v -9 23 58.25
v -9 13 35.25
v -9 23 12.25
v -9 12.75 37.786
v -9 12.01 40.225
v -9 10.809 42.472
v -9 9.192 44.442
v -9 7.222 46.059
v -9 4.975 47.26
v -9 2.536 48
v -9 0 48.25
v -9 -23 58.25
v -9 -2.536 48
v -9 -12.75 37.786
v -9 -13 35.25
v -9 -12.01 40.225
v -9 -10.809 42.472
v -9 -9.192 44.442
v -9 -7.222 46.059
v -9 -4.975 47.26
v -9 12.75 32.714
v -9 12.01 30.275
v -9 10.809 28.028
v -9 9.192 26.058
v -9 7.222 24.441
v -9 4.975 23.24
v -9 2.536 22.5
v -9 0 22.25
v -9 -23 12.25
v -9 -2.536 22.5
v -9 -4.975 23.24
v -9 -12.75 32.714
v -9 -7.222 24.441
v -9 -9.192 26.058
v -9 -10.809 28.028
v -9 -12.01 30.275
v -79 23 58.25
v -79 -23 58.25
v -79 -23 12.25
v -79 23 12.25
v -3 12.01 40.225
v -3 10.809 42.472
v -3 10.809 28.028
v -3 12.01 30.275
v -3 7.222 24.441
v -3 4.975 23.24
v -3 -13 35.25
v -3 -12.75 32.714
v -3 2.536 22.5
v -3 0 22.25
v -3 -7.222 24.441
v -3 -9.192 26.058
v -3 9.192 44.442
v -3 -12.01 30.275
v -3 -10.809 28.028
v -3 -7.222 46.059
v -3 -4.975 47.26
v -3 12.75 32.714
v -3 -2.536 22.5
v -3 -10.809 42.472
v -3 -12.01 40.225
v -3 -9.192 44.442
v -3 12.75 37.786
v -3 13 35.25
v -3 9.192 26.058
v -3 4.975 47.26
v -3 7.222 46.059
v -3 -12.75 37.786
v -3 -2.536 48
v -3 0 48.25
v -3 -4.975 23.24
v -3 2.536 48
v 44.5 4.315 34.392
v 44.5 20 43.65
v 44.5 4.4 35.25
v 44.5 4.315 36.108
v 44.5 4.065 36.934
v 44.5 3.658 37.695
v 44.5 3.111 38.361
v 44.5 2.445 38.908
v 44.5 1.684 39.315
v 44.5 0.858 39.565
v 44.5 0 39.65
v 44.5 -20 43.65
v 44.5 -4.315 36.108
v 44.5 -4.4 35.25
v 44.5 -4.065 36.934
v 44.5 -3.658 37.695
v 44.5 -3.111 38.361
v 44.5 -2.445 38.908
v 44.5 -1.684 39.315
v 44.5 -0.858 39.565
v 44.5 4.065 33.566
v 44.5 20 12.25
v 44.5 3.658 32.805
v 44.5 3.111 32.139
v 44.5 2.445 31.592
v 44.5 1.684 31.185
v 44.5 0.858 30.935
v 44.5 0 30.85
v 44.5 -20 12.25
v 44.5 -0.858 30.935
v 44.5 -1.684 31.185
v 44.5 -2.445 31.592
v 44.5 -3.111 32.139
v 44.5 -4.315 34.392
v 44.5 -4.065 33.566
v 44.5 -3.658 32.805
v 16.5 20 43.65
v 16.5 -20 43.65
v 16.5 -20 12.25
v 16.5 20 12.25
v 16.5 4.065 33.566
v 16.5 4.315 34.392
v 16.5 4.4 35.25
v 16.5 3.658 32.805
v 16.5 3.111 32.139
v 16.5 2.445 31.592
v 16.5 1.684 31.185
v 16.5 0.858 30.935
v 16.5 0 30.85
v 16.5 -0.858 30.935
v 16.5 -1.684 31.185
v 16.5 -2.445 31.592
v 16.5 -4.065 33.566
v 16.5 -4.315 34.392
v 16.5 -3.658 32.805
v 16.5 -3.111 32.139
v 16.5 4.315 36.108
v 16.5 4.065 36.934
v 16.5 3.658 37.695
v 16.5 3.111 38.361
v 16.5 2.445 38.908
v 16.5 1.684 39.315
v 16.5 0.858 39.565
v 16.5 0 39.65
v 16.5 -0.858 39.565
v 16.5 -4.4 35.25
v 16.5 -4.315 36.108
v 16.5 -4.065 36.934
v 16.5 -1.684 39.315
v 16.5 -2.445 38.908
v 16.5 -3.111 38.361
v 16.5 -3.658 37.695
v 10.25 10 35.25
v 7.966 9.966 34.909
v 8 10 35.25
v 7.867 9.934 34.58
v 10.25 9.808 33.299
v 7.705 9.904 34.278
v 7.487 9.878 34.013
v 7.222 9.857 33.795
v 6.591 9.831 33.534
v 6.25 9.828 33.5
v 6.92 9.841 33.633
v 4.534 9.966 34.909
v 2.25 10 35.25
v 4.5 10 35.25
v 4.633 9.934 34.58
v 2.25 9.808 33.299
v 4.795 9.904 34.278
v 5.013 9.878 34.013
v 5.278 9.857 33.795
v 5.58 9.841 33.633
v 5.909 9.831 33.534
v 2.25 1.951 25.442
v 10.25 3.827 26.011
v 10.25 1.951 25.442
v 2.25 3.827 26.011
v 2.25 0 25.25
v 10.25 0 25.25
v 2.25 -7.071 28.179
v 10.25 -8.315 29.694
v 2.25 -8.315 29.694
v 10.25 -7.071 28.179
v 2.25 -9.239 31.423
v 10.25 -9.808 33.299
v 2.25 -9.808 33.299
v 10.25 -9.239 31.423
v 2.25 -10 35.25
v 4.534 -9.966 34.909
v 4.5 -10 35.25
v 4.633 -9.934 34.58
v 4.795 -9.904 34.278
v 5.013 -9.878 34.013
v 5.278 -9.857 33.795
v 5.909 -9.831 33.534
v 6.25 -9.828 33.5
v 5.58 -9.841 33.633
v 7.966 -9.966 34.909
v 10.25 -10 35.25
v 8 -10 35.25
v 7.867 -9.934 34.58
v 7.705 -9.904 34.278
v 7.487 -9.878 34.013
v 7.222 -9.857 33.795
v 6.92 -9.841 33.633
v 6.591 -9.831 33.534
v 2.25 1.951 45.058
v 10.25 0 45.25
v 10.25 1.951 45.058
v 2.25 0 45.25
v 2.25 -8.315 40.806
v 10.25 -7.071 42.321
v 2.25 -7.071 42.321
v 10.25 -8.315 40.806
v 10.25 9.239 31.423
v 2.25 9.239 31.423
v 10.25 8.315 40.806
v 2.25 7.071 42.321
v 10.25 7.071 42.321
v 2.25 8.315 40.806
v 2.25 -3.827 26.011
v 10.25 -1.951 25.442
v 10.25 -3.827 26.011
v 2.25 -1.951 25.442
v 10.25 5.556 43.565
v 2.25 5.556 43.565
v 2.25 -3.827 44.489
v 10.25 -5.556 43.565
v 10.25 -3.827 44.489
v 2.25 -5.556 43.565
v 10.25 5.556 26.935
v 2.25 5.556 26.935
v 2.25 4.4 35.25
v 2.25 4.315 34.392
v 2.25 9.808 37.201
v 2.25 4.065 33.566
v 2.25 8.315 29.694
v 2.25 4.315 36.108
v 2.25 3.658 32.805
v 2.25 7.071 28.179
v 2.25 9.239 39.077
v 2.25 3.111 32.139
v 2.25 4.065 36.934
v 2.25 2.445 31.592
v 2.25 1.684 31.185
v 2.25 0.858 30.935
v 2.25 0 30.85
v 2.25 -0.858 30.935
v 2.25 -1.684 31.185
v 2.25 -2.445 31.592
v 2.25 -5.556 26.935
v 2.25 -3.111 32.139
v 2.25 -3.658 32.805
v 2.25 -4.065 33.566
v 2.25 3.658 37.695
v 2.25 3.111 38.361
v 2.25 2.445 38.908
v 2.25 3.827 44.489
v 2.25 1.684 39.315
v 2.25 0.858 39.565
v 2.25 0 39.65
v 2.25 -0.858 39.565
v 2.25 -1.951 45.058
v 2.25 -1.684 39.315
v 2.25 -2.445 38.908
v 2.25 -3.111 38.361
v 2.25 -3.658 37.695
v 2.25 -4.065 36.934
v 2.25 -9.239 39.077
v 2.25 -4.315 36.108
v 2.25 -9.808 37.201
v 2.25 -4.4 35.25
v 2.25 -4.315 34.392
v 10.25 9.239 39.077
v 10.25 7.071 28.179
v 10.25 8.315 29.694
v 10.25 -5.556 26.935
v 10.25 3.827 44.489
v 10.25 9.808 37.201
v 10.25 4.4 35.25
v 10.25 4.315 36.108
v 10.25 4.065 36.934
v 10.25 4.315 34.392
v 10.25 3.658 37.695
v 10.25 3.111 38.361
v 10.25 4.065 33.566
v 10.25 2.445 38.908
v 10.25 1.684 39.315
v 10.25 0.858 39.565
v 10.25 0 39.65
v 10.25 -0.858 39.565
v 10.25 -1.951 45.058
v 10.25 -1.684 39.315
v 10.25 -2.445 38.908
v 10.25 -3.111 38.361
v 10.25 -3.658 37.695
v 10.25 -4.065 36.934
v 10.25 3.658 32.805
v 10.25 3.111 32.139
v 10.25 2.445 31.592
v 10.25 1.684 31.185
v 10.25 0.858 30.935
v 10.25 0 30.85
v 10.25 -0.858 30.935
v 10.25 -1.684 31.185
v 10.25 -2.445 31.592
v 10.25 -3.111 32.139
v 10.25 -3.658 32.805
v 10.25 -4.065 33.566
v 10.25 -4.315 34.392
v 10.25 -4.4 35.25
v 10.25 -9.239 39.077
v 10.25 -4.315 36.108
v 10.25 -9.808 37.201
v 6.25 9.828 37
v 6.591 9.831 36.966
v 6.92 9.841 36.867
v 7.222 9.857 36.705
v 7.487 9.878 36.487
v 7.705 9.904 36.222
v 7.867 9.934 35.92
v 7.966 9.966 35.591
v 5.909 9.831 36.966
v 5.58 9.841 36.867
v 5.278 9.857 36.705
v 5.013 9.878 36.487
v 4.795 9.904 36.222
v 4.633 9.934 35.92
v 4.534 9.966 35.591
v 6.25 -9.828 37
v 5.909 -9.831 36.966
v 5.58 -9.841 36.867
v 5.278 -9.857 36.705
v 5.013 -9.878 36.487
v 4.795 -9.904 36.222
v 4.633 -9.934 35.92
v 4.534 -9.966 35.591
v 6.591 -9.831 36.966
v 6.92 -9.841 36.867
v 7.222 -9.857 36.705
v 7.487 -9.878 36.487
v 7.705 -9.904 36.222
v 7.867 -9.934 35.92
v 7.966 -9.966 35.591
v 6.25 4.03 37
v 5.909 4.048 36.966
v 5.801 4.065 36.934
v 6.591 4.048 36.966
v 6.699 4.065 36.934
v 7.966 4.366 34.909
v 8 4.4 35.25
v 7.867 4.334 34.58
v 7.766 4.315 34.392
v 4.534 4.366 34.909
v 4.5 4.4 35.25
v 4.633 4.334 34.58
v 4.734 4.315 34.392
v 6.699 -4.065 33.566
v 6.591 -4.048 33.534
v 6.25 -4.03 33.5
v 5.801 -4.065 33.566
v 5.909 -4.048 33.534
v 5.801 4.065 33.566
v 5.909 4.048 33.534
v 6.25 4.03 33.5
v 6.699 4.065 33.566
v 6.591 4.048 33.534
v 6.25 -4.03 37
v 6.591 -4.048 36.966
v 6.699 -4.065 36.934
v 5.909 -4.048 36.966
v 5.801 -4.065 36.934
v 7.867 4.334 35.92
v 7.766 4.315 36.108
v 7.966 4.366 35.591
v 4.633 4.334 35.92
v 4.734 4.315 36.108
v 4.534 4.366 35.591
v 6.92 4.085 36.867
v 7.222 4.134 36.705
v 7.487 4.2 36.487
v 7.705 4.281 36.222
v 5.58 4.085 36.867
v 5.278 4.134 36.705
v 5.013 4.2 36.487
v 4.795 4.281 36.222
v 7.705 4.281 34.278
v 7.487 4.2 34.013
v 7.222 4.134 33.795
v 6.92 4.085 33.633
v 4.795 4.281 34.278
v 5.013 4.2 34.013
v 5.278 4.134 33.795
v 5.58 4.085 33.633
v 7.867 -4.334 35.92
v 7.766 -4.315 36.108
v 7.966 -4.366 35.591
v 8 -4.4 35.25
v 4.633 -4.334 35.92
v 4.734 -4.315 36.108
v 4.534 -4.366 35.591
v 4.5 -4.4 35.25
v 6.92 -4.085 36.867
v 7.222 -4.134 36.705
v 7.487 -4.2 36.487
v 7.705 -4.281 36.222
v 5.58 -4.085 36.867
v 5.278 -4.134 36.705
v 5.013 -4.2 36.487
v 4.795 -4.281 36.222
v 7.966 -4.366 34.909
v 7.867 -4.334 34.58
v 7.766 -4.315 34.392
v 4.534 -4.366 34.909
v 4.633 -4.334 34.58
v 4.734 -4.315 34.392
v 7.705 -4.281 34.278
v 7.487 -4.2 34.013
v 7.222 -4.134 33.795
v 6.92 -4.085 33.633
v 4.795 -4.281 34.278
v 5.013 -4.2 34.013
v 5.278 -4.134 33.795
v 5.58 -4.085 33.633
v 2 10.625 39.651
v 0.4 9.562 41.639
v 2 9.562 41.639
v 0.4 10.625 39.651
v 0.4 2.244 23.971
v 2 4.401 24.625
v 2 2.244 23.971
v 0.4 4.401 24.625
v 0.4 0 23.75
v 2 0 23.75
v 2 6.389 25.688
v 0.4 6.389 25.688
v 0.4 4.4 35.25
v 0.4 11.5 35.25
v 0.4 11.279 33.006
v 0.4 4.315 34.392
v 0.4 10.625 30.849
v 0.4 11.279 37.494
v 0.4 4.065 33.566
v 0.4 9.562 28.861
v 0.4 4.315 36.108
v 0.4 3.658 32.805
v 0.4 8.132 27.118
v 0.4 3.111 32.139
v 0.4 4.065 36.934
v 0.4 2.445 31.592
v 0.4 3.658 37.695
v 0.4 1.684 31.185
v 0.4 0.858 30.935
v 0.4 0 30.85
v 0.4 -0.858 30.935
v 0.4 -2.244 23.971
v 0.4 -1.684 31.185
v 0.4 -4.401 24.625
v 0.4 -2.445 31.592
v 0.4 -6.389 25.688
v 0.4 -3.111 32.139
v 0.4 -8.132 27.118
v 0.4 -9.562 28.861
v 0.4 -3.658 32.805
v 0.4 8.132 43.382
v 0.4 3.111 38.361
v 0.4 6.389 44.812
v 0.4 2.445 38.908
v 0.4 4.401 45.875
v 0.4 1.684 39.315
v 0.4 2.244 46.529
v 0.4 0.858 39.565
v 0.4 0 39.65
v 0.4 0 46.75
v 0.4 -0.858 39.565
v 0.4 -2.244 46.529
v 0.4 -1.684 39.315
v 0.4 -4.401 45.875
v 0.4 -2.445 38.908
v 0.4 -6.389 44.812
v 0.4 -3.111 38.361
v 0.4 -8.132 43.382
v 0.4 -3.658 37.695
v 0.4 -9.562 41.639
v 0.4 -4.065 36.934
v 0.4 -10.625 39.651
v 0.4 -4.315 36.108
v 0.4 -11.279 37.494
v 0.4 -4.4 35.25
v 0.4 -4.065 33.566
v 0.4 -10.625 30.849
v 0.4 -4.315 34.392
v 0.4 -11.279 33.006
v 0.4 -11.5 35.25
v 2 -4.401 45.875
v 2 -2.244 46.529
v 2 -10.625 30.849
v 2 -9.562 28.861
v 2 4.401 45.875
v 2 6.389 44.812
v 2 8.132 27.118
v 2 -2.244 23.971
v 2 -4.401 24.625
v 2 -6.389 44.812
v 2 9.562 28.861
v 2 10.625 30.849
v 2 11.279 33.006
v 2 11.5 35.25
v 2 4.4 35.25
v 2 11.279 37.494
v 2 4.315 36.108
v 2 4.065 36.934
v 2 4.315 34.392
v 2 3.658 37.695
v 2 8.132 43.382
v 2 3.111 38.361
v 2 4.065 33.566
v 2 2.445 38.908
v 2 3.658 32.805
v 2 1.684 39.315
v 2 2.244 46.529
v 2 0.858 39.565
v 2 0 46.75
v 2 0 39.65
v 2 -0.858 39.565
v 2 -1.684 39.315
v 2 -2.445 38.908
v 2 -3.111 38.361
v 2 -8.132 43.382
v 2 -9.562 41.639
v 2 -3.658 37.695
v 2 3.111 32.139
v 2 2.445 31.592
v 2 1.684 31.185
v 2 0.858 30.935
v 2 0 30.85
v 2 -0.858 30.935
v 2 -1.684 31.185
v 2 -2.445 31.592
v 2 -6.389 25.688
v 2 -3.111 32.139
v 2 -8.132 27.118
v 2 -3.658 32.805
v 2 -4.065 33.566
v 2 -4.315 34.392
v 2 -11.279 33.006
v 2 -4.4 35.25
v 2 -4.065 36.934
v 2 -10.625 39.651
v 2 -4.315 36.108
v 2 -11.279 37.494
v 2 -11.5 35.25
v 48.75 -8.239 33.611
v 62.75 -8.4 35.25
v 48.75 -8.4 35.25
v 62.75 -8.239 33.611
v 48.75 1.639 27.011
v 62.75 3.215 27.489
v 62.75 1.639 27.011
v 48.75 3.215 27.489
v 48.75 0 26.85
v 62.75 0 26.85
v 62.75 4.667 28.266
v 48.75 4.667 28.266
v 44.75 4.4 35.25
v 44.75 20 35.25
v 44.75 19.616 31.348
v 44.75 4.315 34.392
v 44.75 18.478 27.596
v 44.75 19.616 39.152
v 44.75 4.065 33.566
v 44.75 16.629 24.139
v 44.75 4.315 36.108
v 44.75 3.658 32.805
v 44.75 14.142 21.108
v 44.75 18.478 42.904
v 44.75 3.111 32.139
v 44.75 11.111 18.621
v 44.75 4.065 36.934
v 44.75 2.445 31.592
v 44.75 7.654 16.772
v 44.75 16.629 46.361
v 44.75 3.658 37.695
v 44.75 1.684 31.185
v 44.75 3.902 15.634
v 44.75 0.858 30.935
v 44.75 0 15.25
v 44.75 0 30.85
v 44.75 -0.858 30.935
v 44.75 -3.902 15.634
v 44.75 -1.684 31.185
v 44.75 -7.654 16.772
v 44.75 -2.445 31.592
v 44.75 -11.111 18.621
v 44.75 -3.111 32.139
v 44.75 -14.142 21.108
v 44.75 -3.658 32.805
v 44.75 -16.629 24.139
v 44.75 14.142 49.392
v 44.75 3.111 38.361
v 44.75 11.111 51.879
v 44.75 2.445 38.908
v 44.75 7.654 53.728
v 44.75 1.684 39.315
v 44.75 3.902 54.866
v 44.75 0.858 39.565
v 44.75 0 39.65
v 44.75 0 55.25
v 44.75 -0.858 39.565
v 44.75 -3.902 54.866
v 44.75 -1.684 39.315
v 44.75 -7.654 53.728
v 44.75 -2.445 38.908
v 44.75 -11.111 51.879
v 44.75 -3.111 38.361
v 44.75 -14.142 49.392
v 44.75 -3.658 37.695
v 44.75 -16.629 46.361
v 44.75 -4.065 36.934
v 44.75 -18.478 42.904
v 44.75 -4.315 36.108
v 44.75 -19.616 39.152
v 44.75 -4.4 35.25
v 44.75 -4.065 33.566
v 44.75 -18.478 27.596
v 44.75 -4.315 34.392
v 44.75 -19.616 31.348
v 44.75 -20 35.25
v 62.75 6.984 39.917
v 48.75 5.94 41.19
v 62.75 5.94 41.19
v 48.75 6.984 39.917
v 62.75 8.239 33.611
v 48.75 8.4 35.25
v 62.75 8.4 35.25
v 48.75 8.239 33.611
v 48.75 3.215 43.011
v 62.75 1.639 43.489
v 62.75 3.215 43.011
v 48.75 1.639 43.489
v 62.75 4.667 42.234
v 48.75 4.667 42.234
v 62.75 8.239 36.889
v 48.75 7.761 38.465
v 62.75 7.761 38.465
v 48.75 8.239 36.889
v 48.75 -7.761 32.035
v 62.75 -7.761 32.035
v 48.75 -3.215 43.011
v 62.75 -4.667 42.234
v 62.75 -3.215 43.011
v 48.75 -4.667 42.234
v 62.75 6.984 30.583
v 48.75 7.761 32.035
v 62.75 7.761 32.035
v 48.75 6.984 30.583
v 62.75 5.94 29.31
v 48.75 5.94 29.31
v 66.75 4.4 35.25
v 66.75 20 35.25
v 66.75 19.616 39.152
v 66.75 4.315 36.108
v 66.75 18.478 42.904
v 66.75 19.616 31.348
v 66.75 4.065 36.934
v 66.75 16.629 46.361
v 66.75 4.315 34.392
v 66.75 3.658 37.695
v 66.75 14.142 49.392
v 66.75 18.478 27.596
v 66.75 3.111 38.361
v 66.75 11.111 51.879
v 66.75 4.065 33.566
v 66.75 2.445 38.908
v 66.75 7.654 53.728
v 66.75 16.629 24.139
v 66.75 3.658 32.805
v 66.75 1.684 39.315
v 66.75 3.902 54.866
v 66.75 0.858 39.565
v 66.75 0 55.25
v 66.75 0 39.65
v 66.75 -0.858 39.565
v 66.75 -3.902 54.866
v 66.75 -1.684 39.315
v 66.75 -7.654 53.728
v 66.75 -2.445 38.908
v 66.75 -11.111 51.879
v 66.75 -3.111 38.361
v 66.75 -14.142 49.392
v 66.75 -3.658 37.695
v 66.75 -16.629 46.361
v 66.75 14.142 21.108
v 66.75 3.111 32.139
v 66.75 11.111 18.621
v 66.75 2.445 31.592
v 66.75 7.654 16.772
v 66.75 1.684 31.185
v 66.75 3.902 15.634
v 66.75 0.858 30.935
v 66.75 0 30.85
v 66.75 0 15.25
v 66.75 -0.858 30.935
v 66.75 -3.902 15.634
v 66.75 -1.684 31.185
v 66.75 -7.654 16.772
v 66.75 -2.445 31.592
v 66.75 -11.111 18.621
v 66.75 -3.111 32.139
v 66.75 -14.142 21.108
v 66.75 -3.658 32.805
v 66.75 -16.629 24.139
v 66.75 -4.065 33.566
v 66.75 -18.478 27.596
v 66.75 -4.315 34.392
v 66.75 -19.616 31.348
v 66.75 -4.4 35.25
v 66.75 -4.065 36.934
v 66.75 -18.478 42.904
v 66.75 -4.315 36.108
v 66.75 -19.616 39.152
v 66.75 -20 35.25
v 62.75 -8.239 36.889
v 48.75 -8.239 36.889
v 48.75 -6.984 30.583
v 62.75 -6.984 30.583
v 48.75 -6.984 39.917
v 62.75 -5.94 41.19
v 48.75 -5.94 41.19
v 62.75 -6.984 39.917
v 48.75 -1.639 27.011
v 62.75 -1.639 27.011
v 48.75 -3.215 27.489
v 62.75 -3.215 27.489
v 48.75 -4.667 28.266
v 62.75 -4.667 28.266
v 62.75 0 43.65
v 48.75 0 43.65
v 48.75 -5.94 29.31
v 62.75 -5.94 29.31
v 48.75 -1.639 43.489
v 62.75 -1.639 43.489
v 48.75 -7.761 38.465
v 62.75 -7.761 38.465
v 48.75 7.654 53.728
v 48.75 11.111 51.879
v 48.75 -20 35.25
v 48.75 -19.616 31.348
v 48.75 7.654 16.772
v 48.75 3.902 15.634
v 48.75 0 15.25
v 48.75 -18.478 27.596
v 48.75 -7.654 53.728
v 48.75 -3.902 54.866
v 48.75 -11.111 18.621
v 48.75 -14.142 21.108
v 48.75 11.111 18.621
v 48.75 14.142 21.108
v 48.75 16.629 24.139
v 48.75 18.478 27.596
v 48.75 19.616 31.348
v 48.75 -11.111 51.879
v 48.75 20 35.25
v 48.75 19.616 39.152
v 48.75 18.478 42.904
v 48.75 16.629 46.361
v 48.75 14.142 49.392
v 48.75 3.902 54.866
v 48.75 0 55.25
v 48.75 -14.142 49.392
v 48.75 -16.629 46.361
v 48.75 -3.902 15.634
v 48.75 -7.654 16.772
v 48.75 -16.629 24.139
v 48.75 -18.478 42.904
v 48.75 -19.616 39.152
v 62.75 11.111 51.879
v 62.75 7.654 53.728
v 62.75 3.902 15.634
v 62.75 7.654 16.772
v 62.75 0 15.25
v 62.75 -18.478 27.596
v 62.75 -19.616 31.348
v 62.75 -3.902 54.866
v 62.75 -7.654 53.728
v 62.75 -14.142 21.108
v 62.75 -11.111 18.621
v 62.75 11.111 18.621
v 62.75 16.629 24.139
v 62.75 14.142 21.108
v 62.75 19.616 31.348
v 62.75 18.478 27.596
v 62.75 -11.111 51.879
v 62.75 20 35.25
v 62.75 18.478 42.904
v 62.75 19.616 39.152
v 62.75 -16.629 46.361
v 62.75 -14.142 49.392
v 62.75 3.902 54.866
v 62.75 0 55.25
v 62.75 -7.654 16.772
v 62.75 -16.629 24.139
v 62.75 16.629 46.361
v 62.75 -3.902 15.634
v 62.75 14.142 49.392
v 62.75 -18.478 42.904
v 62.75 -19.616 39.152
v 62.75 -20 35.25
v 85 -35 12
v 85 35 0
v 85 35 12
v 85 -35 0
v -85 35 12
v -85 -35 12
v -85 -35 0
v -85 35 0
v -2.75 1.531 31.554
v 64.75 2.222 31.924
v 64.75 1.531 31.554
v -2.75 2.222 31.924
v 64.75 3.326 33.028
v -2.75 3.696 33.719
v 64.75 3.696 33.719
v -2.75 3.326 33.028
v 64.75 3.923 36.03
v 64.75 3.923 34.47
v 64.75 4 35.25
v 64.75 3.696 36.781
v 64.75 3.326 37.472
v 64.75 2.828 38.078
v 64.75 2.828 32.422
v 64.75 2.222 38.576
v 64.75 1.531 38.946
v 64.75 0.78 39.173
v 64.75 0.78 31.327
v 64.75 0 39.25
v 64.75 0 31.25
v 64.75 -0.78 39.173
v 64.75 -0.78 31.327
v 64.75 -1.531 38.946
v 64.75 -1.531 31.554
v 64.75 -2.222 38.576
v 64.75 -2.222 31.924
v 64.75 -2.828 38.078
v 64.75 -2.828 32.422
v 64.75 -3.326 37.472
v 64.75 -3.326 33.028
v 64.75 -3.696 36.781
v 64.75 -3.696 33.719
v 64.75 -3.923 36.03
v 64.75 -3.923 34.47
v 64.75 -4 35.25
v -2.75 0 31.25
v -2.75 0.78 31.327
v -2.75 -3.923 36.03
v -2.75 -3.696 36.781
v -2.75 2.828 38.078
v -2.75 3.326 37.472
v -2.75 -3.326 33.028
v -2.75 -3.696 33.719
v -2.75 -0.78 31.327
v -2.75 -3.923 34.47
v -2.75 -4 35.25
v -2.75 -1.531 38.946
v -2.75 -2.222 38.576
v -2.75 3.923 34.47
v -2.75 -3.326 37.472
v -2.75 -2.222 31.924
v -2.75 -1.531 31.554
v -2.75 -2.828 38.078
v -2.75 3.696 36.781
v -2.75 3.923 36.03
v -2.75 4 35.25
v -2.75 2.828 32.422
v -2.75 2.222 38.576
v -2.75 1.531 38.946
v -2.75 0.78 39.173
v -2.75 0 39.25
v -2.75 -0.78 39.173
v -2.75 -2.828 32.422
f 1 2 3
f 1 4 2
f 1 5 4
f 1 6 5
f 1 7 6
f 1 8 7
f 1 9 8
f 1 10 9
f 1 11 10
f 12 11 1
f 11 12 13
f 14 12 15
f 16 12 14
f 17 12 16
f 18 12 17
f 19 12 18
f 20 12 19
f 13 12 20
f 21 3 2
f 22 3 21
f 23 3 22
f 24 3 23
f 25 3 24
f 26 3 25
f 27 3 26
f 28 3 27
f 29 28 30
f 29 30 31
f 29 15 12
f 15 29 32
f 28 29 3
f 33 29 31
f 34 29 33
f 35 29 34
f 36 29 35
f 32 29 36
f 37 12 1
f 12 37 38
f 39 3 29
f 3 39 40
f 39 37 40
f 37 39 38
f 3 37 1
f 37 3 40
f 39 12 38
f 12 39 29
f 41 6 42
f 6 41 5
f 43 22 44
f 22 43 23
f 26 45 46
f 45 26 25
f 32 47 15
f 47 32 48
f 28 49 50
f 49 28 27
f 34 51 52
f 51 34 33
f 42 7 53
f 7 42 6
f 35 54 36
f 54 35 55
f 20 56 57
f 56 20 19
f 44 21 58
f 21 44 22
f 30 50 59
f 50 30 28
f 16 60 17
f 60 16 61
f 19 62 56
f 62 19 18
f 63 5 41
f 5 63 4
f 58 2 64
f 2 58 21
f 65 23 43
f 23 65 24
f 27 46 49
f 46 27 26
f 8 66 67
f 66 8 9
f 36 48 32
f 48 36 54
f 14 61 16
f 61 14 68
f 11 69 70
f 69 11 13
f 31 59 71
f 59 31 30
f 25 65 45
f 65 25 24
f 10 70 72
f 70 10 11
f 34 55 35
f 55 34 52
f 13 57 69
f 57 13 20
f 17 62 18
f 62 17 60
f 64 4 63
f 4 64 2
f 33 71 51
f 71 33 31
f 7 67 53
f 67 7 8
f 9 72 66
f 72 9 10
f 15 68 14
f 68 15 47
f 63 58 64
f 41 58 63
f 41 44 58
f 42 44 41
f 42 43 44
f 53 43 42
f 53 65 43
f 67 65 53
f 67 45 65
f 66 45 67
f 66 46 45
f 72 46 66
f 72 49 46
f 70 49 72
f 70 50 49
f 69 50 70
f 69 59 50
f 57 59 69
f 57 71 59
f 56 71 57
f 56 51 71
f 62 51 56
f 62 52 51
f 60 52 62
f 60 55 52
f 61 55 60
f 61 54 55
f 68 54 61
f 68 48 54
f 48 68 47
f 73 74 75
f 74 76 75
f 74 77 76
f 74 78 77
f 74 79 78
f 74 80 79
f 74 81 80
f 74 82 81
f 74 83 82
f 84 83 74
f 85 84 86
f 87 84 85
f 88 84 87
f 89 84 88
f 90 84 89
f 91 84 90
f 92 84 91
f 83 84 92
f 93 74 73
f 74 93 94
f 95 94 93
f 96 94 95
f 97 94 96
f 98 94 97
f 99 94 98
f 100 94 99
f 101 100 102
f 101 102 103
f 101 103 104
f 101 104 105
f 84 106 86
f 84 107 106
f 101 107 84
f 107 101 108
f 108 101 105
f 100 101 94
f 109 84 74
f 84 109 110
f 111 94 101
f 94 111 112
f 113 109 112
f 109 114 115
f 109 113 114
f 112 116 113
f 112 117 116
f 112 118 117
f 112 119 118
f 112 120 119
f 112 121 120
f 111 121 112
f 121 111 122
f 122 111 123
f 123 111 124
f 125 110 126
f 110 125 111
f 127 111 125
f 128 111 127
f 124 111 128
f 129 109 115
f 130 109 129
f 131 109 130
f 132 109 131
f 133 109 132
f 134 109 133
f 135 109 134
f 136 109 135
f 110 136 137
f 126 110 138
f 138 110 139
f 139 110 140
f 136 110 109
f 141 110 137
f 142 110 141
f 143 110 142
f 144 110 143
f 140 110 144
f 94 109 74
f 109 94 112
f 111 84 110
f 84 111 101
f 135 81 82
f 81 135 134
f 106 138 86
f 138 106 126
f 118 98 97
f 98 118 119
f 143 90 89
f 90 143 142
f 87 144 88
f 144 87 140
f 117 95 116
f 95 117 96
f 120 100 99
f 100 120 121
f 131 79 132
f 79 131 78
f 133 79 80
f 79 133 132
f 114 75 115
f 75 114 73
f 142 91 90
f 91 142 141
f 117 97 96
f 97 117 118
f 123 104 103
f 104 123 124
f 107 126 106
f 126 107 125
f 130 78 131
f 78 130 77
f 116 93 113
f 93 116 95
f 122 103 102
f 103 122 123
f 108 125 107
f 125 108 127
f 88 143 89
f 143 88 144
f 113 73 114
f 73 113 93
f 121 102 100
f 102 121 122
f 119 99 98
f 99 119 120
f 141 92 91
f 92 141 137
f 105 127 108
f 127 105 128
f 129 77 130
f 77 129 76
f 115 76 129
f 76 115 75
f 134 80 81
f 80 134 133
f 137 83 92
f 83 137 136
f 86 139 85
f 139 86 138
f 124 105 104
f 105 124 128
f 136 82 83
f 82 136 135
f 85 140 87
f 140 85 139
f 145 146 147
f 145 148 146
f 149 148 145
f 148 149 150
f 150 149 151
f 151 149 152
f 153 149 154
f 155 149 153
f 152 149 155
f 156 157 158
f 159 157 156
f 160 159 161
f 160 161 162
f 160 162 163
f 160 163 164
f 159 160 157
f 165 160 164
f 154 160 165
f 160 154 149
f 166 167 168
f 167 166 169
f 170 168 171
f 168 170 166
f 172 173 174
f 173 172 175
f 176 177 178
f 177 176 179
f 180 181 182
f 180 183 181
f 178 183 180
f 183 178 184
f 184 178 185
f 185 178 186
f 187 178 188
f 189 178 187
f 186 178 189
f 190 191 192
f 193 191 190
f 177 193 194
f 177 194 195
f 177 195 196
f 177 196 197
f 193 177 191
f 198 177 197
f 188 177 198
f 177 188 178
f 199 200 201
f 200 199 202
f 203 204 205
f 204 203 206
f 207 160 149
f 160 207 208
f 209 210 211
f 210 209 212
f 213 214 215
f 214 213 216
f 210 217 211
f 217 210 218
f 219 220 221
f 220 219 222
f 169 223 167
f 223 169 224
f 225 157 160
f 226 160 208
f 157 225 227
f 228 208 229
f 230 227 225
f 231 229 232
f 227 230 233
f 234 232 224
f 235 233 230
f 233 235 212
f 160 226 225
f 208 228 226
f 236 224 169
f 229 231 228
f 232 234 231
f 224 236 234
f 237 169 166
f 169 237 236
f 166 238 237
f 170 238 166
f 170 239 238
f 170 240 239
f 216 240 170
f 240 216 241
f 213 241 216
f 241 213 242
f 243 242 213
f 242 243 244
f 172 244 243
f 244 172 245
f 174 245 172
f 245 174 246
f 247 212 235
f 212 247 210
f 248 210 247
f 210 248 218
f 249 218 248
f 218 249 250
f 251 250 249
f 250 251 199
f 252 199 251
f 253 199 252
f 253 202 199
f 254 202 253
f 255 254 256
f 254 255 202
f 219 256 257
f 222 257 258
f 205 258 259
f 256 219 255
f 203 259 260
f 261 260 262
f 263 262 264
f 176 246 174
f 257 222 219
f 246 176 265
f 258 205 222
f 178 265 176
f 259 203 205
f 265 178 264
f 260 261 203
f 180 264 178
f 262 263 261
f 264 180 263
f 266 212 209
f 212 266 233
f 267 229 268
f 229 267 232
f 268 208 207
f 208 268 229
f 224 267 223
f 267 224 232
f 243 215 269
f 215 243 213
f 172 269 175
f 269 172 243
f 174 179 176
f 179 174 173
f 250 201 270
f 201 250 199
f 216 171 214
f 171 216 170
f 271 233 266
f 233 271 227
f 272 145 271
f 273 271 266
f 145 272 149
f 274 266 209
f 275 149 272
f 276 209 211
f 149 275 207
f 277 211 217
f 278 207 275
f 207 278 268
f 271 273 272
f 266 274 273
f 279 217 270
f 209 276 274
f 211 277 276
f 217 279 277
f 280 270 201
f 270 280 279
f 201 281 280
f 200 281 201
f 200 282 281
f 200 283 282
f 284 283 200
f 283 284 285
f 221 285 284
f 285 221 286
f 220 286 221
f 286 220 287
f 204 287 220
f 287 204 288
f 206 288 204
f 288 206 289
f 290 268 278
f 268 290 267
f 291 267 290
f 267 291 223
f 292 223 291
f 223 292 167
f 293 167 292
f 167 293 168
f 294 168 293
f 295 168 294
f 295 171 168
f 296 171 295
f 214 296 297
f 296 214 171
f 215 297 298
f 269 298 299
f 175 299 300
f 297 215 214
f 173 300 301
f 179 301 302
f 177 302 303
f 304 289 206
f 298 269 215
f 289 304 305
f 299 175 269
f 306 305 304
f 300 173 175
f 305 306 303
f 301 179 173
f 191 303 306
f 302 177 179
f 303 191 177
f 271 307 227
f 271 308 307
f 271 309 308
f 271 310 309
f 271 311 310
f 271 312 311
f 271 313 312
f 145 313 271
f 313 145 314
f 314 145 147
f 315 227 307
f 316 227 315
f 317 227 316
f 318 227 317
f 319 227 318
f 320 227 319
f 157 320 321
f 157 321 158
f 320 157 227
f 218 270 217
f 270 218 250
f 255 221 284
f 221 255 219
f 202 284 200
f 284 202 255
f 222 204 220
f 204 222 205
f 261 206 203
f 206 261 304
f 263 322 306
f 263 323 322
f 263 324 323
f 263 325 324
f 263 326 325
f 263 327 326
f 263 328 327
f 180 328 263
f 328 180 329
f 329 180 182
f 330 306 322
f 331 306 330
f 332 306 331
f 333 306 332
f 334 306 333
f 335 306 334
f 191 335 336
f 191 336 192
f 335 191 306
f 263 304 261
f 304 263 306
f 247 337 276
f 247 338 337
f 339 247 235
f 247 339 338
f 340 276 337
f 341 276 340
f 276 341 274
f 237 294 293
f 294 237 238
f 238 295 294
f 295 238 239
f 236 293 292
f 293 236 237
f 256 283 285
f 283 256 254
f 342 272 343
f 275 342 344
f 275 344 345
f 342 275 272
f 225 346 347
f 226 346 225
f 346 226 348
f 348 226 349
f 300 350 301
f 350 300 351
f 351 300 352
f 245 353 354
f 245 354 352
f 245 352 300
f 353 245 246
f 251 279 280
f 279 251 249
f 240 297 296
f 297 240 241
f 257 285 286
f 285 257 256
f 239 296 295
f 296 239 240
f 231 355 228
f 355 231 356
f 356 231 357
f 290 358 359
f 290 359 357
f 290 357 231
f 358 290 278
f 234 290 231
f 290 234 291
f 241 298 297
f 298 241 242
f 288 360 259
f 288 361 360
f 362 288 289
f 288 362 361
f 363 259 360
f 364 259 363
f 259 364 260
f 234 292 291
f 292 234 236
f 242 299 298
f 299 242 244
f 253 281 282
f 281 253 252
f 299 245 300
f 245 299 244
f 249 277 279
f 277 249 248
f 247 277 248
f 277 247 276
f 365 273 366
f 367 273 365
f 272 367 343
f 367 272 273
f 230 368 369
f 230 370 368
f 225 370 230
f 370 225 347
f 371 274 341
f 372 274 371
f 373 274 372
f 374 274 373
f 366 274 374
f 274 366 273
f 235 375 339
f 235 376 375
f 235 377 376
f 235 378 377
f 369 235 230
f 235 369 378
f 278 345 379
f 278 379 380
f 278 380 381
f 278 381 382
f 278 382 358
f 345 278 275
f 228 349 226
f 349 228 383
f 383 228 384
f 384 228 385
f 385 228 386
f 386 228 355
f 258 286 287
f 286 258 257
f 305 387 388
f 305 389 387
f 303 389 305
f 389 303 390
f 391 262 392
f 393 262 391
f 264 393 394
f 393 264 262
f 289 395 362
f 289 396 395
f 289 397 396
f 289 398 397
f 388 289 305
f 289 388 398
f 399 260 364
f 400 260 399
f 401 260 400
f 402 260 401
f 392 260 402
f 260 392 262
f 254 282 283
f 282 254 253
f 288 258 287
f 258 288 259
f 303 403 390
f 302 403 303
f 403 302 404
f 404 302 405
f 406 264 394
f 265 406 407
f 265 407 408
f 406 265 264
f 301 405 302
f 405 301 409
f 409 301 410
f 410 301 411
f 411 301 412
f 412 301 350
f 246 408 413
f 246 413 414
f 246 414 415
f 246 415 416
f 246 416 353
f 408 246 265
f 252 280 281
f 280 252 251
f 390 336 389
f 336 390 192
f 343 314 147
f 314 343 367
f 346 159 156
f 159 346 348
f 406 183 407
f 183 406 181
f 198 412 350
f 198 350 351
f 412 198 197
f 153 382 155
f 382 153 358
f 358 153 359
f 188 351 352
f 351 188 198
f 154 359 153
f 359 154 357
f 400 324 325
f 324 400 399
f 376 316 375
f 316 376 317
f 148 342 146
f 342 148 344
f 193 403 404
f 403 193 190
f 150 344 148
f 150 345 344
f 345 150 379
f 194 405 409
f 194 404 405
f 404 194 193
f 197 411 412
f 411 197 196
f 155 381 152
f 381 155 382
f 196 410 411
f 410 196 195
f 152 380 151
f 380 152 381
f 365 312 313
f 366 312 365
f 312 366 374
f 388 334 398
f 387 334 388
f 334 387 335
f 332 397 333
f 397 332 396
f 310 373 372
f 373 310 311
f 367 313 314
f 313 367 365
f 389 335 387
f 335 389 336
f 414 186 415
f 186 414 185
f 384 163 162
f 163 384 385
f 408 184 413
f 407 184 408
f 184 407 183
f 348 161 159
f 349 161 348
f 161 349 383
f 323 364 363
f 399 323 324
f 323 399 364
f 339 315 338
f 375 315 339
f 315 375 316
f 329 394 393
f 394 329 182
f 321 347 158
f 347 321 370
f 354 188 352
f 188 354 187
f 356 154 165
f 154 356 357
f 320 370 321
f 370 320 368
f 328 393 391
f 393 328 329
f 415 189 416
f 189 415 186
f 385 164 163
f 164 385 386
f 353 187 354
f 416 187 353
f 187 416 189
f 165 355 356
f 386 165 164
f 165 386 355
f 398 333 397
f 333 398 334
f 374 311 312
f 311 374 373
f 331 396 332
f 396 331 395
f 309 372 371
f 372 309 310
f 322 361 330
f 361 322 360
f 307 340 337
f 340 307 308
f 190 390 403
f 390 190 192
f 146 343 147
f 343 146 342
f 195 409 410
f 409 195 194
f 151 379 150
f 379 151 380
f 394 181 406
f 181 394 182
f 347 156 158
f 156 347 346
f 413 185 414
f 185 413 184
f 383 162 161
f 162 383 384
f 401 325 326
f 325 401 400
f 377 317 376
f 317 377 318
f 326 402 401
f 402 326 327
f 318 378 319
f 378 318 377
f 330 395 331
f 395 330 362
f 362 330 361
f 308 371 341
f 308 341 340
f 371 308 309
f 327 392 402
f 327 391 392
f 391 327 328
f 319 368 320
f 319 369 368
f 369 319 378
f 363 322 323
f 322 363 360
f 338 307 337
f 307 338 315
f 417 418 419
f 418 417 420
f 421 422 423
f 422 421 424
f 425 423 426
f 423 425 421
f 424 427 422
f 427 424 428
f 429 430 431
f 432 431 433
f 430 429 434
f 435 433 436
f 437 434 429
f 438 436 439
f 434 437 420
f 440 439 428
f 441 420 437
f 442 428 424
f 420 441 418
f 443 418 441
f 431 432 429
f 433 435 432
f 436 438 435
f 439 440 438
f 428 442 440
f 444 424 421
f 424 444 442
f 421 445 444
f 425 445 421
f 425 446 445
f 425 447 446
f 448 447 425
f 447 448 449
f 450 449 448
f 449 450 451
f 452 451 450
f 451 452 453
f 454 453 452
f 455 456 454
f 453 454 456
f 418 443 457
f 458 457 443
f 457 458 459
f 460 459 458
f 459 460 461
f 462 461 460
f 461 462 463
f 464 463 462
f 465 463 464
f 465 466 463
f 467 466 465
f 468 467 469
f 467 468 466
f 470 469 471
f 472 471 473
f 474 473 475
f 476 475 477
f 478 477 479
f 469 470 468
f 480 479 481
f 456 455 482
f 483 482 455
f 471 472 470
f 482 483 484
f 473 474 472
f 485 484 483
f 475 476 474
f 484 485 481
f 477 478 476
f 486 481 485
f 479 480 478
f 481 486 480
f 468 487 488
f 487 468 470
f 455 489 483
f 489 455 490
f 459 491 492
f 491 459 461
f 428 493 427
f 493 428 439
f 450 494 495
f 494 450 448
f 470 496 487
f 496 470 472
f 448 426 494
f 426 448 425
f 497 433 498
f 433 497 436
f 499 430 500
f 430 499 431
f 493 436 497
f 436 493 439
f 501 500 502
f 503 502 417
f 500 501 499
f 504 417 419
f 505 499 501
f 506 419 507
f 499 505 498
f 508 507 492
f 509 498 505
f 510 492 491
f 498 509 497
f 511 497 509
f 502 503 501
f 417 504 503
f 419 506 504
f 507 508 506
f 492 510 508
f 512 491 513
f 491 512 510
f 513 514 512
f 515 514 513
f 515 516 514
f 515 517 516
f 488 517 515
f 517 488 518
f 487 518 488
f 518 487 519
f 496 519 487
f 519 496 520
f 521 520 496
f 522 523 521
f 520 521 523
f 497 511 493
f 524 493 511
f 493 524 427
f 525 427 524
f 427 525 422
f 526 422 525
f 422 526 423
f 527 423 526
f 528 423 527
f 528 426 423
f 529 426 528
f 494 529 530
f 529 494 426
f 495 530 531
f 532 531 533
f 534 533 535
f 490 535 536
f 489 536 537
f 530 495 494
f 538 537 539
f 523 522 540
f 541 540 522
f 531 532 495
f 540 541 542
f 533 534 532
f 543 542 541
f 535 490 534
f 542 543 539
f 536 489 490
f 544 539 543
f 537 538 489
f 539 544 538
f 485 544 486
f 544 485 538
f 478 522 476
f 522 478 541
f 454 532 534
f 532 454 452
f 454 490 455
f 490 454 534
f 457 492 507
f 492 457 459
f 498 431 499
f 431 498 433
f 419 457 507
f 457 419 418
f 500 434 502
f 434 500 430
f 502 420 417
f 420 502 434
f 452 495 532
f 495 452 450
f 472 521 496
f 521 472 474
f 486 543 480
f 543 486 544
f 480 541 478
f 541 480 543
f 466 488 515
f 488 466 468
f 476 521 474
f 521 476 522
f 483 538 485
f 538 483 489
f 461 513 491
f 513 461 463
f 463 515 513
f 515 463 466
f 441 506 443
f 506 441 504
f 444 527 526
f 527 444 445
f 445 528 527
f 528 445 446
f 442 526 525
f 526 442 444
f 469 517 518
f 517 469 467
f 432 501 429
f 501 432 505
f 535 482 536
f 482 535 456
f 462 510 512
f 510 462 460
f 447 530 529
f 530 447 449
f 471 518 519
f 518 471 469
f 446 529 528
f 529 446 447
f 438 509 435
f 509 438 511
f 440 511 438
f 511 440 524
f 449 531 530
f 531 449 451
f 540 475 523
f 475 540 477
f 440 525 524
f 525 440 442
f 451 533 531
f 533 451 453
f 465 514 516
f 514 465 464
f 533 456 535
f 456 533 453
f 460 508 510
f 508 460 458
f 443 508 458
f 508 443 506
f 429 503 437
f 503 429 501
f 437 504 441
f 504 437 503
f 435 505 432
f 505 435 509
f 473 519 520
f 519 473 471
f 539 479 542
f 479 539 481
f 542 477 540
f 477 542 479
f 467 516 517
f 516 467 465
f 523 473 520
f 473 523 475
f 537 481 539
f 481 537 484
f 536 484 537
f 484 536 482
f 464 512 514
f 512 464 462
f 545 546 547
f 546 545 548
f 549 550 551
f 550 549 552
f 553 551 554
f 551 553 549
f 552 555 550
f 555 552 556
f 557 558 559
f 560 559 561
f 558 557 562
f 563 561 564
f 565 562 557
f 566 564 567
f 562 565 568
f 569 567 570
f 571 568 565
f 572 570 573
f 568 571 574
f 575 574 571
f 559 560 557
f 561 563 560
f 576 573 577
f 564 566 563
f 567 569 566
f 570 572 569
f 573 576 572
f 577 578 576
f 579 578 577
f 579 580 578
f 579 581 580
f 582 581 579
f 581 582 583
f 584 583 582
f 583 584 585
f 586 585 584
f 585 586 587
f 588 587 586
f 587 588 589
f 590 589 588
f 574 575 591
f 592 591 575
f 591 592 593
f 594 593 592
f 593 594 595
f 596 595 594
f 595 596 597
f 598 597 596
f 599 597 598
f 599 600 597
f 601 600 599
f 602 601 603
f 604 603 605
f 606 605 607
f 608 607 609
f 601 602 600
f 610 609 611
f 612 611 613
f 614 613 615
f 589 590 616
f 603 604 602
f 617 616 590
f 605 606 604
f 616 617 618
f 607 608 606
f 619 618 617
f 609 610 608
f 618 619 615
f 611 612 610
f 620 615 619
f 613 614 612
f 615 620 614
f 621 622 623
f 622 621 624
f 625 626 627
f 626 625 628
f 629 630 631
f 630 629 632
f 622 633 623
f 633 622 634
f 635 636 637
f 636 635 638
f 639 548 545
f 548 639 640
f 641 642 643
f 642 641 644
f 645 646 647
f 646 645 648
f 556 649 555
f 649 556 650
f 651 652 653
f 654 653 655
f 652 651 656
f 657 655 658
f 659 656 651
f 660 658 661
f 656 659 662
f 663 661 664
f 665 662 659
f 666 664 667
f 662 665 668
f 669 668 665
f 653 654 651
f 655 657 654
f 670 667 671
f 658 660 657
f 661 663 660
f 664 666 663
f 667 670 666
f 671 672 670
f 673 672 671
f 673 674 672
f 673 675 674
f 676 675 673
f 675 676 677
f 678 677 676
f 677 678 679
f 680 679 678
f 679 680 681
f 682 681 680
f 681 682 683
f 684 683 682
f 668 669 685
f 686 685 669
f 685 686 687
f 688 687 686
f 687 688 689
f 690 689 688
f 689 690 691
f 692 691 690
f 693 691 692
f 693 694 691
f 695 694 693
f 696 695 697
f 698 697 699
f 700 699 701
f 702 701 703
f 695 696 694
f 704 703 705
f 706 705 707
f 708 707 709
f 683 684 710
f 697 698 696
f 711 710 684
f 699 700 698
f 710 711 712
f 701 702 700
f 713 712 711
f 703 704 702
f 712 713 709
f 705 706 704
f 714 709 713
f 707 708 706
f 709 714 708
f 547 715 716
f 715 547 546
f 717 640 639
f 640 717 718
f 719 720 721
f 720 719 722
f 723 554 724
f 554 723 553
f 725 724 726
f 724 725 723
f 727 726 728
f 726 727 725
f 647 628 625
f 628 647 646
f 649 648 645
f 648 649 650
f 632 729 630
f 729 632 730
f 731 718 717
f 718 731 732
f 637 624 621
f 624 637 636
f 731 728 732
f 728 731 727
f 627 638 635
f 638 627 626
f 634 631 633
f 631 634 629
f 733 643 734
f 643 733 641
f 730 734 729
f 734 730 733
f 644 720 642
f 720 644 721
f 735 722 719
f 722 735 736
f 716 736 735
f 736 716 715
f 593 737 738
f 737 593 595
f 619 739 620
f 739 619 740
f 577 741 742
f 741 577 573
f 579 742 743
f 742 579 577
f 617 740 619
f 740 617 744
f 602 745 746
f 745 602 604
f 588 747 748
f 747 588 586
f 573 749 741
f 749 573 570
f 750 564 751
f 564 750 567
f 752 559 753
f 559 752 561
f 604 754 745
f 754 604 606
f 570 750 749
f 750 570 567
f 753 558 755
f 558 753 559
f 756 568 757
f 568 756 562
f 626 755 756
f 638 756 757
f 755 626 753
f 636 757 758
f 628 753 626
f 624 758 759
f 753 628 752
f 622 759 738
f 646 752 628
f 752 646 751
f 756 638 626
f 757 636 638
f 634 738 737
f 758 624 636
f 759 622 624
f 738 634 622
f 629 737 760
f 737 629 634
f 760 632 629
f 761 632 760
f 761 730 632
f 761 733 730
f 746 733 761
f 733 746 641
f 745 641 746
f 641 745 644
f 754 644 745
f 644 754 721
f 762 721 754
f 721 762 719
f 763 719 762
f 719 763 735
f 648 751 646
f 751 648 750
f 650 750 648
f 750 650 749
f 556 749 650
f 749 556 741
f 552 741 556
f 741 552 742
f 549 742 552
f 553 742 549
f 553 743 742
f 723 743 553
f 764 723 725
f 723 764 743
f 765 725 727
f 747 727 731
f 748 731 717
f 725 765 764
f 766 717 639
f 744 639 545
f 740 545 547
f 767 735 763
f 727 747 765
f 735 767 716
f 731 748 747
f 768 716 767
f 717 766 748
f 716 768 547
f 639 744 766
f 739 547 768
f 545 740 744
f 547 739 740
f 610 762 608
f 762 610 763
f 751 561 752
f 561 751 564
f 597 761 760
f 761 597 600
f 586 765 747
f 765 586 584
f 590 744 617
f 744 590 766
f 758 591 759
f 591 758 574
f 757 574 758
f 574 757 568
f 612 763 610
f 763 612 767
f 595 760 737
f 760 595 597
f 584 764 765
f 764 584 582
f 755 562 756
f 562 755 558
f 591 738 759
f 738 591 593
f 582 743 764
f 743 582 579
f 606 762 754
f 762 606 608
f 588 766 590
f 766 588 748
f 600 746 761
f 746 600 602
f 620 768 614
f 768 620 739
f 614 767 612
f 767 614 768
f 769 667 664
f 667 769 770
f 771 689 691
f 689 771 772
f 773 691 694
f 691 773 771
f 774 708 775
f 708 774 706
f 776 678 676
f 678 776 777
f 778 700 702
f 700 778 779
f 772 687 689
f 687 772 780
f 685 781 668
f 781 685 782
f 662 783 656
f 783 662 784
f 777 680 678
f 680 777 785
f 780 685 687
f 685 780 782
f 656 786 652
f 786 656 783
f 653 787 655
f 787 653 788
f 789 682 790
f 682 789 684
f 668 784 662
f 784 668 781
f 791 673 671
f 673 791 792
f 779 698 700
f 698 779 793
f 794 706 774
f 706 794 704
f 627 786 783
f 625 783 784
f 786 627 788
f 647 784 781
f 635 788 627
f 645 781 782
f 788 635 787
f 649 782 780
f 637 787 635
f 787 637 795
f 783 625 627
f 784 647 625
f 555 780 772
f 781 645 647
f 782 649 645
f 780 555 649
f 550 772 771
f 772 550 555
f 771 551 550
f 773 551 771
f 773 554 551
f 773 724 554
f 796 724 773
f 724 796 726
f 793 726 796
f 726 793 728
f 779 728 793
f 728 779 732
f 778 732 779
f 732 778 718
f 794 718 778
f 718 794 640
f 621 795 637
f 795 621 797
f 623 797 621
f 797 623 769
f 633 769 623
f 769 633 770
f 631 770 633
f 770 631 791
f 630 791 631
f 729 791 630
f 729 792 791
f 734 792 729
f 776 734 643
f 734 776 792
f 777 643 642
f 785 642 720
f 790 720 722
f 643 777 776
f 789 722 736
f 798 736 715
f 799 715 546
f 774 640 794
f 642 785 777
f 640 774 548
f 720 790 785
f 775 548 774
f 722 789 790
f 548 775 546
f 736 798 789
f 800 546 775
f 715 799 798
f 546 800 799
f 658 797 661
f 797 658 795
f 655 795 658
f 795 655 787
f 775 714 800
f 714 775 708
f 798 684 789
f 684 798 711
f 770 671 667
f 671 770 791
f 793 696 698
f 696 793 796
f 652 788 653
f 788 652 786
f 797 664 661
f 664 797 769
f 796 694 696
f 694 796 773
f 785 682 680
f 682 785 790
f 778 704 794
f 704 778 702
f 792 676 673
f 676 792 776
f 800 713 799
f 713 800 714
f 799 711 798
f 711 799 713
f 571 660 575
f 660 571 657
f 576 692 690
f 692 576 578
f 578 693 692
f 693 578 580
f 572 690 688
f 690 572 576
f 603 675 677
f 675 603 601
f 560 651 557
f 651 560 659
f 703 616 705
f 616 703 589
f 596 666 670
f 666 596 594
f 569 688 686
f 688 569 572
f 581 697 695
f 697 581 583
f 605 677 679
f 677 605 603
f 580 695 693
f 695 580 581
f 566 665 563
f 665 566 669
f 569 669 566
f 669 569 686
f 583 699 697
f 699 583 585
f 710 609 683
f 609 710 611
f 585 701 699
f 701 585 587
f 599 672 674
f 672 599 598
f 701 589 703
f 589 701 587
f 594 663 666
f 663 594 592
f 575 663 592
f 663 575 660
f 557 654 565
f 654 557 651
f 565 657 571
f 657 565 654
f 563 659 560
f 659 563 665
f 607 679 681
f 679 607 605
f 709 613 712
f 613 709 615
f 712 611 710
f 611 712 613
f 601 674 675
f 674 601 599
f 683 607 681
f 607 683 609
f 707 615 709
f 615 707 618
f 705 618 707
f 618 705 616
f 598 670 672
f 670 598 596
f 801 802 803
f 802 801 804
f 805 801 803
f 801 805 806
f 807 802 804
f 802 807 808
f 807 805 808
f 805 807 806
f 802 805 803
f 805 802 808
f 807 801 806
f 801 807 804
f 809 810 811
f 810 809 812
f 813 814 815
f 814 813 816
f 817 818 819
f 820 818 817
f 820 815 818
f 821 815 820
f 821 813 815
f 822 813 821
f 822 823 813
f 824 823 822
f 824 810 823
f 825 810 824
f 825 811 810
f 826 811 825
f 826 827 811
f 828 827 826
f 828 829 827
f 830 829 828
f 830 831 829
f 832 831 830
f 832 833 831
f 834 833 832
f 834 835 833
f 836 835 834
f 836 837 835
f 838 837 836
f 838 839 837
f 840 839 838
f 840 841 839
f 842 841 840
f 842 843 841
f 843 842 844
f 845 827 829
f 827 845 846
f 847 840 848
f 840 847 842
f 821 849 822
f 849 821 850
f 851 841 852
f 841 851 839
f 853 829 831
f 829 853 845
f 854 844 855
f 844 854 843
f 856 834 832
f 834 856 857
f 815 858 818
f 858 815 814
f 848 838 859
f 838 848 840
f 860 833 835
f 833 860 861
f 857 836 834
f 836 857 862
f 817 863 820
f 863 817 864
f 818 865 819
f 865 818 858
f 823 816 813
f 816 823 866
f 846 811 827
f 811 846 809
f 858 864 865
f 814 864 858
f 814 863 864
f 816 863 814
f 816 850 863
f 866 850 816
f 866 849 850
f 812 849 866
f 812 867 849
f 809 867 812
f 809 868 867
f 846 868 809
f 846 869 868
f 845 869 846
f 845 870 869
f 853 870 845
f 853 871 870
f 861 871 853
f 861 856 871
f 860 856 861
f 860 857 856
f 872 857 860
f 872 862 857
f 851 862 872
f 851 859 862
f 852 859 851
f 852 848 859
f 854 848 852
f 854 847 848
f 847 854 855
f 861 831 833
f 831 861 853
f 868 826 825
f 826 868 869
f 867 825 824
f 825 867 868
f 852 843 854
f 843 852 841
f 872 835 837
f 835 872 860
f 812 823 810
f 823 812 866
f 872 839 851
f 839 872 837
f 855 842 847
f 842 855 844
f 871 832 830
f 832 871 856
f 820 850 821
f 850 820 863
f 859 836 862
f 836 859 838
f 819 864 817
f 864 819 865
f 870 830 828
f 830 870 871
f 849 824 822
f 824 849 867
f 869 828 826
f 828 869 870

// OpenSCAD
$fn = 32;

// ------------------------------------------------------------------------
// Motor drive station: motor 70 x 46 mm, shaft d8, pulley d40
// Every part is its own module, assembly() places every instance.
// ------------------------------------------------------------------------

// --- part 1 ---
module station_bed() {
  difference() {
    translate([-85, -35, 0]) cube([170, 70, 12]);
  }
}

// --- part 2 ---
module drive_motor() {
  union() {
    translate([-35, -23, 0]) cube([70, 46, 46]);
    translate([38, 0, 23]) rotate([0, 90, 0]) cylinder(h = 6, d = 26, center = true);
  }
}

// --- part 3 ---
module pillow_block() {
  difference() {
    translate([-14, -20, 0]) cube([28, 40, 31.4]);
    translate([0, 0, 23]) rotate([0, 90, 0]) cylinder(h = 30, d = 8.8, center = true);
  }
}

// --- part 4 ---
module drive_shaft() {
  translate([0, 0, -33.75]) cylinder(h = 67.5, d = 8);
}

// --- part 5 ---
module shaft_collar() {
  difference() {
    cylinder(h = 8, d = 20);
    translate([0, 0, -1]) cylinder(h = 10, d = 8.8);
    translate([0, 0, 4]) rotate([90, 0, 0]) cylinder(h = 22, d = 3.5, center = true);
  }
}

// --- part 6 ---
module collar_washer() {
  difference() {
      translate([0, 0, 0]) cylinder(h = 1.6, d = 23);
      translate([0, 0, -1]) cylinder(h = 3.6, d = 8.8);
    }
}

// --- part 7 ---
module drive_pulley() {
  difference() {
    union() {
      cylinder(h = 22, d = 16.8);
      cylinder(h = 4, d = 40);
      translate([0, 0, 18]) cylinder(h = 4, d = 40);
    }
    translate([0, 0, -1]) cylinder(h = 24, d = 8.8);
  }
}

// --- assembly ---
module assembly() {
  color([0.80, 0.24, 0.20]) translate([0, 0, 0]) rotate([0, 0, 0]) station_bed();
  color([0.20, 0.45, 0.75]) translate([-44, 0, 12.25]) rotate([0, 0, 0]) drive_motor();
  color([0.25, 0.62, 0.32]) translate([30.5, 0, 12.25]) rotate([0, 0, 0]) pillow_block();
  color([0.92, 0.70, 0.18]) translate([31, 0, 35.25]) rotate([0, 90, 0]) drive_shaft();
  color([0.58, 0.35, 0.70]) translate([2.25, 0, 35.25]) rotate([0, 90, 0]) shaft_collar();
  color([0.16, 0.66, 0.66]) translate([0.4, 0, 35.25]) rotate([0, 90, 0]) collar_washer();
  color([0.85, 0.48, 0.18]) translate([44.75, 0, 35.25]) rotate([0, 90, 0]) drive_pulley();
}

assembly();
